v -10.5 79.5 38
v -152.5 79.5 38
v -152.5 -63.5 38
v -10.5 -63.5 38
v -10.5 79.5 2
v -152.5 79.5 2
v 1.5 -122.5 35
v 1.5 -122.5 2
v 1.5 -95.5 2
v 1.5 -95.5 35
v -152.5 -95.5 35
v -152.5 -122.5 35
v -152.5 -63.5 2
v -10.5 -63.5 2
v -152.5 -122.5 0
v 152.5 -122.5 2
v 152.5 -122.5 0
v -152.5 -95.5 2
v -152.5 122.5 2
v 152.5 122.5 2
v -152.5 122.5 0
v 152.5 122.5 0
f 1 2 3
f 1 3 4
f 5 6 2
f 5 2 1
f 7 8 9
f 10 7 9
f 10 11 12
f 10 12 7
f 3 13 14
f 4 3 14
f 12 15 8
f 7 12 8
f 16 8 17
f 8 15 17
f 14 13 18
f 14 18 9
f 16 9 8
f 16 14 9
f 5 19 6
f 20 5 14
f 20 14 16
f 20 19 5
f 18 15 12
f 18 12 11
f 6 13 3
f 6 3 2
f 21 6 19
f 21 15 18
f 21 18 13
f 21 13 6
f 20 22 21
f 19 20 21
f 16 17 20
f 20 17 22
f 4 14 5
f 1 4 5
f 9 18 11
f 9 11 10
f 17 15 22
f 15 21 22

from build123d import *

# Parameters (mm, degrees)
F1_DEPTH = 2
F0_W     = 142
F0_H     = 143
F2_DEPTH = 38
F0_W_2   = 154
F0_H_2   = 27
F3_DEPTH = 35


with BuildPart() as f1:
    # F0 (on Top) → F1 (new body)
    with BuildSketch(Plane.XY):
        Polygon((152.5, 122.5), (-152.5, 122.5), (-152.5, 79.5), (-10.5, 79.5), (-10.5, -63.5), (-152.5, -63.5), (-152.5, -95.5), (1.5, -95.5), (1.5, -122.5), (152.5, -122.5), align=None)
    extrude(amount=F1_DEPTH)

    # F0 (on Top) → F2 (join)
    with BuildSketch(Plane.XY):
        with Locations((-81.5, 8)):
            Rectangle(F0_W, F0_H)
    extrude(amount=F2_DEPTH)

    # F0 (on Top) → F3 (join)
    with BuildSketch(Plane.XY):
        with Locations((-75.5, -109)):
            Rectangle(F0_W_2, F0_H_2)
    extrude(amount=F3_DEPTH)


solid = f1.part
